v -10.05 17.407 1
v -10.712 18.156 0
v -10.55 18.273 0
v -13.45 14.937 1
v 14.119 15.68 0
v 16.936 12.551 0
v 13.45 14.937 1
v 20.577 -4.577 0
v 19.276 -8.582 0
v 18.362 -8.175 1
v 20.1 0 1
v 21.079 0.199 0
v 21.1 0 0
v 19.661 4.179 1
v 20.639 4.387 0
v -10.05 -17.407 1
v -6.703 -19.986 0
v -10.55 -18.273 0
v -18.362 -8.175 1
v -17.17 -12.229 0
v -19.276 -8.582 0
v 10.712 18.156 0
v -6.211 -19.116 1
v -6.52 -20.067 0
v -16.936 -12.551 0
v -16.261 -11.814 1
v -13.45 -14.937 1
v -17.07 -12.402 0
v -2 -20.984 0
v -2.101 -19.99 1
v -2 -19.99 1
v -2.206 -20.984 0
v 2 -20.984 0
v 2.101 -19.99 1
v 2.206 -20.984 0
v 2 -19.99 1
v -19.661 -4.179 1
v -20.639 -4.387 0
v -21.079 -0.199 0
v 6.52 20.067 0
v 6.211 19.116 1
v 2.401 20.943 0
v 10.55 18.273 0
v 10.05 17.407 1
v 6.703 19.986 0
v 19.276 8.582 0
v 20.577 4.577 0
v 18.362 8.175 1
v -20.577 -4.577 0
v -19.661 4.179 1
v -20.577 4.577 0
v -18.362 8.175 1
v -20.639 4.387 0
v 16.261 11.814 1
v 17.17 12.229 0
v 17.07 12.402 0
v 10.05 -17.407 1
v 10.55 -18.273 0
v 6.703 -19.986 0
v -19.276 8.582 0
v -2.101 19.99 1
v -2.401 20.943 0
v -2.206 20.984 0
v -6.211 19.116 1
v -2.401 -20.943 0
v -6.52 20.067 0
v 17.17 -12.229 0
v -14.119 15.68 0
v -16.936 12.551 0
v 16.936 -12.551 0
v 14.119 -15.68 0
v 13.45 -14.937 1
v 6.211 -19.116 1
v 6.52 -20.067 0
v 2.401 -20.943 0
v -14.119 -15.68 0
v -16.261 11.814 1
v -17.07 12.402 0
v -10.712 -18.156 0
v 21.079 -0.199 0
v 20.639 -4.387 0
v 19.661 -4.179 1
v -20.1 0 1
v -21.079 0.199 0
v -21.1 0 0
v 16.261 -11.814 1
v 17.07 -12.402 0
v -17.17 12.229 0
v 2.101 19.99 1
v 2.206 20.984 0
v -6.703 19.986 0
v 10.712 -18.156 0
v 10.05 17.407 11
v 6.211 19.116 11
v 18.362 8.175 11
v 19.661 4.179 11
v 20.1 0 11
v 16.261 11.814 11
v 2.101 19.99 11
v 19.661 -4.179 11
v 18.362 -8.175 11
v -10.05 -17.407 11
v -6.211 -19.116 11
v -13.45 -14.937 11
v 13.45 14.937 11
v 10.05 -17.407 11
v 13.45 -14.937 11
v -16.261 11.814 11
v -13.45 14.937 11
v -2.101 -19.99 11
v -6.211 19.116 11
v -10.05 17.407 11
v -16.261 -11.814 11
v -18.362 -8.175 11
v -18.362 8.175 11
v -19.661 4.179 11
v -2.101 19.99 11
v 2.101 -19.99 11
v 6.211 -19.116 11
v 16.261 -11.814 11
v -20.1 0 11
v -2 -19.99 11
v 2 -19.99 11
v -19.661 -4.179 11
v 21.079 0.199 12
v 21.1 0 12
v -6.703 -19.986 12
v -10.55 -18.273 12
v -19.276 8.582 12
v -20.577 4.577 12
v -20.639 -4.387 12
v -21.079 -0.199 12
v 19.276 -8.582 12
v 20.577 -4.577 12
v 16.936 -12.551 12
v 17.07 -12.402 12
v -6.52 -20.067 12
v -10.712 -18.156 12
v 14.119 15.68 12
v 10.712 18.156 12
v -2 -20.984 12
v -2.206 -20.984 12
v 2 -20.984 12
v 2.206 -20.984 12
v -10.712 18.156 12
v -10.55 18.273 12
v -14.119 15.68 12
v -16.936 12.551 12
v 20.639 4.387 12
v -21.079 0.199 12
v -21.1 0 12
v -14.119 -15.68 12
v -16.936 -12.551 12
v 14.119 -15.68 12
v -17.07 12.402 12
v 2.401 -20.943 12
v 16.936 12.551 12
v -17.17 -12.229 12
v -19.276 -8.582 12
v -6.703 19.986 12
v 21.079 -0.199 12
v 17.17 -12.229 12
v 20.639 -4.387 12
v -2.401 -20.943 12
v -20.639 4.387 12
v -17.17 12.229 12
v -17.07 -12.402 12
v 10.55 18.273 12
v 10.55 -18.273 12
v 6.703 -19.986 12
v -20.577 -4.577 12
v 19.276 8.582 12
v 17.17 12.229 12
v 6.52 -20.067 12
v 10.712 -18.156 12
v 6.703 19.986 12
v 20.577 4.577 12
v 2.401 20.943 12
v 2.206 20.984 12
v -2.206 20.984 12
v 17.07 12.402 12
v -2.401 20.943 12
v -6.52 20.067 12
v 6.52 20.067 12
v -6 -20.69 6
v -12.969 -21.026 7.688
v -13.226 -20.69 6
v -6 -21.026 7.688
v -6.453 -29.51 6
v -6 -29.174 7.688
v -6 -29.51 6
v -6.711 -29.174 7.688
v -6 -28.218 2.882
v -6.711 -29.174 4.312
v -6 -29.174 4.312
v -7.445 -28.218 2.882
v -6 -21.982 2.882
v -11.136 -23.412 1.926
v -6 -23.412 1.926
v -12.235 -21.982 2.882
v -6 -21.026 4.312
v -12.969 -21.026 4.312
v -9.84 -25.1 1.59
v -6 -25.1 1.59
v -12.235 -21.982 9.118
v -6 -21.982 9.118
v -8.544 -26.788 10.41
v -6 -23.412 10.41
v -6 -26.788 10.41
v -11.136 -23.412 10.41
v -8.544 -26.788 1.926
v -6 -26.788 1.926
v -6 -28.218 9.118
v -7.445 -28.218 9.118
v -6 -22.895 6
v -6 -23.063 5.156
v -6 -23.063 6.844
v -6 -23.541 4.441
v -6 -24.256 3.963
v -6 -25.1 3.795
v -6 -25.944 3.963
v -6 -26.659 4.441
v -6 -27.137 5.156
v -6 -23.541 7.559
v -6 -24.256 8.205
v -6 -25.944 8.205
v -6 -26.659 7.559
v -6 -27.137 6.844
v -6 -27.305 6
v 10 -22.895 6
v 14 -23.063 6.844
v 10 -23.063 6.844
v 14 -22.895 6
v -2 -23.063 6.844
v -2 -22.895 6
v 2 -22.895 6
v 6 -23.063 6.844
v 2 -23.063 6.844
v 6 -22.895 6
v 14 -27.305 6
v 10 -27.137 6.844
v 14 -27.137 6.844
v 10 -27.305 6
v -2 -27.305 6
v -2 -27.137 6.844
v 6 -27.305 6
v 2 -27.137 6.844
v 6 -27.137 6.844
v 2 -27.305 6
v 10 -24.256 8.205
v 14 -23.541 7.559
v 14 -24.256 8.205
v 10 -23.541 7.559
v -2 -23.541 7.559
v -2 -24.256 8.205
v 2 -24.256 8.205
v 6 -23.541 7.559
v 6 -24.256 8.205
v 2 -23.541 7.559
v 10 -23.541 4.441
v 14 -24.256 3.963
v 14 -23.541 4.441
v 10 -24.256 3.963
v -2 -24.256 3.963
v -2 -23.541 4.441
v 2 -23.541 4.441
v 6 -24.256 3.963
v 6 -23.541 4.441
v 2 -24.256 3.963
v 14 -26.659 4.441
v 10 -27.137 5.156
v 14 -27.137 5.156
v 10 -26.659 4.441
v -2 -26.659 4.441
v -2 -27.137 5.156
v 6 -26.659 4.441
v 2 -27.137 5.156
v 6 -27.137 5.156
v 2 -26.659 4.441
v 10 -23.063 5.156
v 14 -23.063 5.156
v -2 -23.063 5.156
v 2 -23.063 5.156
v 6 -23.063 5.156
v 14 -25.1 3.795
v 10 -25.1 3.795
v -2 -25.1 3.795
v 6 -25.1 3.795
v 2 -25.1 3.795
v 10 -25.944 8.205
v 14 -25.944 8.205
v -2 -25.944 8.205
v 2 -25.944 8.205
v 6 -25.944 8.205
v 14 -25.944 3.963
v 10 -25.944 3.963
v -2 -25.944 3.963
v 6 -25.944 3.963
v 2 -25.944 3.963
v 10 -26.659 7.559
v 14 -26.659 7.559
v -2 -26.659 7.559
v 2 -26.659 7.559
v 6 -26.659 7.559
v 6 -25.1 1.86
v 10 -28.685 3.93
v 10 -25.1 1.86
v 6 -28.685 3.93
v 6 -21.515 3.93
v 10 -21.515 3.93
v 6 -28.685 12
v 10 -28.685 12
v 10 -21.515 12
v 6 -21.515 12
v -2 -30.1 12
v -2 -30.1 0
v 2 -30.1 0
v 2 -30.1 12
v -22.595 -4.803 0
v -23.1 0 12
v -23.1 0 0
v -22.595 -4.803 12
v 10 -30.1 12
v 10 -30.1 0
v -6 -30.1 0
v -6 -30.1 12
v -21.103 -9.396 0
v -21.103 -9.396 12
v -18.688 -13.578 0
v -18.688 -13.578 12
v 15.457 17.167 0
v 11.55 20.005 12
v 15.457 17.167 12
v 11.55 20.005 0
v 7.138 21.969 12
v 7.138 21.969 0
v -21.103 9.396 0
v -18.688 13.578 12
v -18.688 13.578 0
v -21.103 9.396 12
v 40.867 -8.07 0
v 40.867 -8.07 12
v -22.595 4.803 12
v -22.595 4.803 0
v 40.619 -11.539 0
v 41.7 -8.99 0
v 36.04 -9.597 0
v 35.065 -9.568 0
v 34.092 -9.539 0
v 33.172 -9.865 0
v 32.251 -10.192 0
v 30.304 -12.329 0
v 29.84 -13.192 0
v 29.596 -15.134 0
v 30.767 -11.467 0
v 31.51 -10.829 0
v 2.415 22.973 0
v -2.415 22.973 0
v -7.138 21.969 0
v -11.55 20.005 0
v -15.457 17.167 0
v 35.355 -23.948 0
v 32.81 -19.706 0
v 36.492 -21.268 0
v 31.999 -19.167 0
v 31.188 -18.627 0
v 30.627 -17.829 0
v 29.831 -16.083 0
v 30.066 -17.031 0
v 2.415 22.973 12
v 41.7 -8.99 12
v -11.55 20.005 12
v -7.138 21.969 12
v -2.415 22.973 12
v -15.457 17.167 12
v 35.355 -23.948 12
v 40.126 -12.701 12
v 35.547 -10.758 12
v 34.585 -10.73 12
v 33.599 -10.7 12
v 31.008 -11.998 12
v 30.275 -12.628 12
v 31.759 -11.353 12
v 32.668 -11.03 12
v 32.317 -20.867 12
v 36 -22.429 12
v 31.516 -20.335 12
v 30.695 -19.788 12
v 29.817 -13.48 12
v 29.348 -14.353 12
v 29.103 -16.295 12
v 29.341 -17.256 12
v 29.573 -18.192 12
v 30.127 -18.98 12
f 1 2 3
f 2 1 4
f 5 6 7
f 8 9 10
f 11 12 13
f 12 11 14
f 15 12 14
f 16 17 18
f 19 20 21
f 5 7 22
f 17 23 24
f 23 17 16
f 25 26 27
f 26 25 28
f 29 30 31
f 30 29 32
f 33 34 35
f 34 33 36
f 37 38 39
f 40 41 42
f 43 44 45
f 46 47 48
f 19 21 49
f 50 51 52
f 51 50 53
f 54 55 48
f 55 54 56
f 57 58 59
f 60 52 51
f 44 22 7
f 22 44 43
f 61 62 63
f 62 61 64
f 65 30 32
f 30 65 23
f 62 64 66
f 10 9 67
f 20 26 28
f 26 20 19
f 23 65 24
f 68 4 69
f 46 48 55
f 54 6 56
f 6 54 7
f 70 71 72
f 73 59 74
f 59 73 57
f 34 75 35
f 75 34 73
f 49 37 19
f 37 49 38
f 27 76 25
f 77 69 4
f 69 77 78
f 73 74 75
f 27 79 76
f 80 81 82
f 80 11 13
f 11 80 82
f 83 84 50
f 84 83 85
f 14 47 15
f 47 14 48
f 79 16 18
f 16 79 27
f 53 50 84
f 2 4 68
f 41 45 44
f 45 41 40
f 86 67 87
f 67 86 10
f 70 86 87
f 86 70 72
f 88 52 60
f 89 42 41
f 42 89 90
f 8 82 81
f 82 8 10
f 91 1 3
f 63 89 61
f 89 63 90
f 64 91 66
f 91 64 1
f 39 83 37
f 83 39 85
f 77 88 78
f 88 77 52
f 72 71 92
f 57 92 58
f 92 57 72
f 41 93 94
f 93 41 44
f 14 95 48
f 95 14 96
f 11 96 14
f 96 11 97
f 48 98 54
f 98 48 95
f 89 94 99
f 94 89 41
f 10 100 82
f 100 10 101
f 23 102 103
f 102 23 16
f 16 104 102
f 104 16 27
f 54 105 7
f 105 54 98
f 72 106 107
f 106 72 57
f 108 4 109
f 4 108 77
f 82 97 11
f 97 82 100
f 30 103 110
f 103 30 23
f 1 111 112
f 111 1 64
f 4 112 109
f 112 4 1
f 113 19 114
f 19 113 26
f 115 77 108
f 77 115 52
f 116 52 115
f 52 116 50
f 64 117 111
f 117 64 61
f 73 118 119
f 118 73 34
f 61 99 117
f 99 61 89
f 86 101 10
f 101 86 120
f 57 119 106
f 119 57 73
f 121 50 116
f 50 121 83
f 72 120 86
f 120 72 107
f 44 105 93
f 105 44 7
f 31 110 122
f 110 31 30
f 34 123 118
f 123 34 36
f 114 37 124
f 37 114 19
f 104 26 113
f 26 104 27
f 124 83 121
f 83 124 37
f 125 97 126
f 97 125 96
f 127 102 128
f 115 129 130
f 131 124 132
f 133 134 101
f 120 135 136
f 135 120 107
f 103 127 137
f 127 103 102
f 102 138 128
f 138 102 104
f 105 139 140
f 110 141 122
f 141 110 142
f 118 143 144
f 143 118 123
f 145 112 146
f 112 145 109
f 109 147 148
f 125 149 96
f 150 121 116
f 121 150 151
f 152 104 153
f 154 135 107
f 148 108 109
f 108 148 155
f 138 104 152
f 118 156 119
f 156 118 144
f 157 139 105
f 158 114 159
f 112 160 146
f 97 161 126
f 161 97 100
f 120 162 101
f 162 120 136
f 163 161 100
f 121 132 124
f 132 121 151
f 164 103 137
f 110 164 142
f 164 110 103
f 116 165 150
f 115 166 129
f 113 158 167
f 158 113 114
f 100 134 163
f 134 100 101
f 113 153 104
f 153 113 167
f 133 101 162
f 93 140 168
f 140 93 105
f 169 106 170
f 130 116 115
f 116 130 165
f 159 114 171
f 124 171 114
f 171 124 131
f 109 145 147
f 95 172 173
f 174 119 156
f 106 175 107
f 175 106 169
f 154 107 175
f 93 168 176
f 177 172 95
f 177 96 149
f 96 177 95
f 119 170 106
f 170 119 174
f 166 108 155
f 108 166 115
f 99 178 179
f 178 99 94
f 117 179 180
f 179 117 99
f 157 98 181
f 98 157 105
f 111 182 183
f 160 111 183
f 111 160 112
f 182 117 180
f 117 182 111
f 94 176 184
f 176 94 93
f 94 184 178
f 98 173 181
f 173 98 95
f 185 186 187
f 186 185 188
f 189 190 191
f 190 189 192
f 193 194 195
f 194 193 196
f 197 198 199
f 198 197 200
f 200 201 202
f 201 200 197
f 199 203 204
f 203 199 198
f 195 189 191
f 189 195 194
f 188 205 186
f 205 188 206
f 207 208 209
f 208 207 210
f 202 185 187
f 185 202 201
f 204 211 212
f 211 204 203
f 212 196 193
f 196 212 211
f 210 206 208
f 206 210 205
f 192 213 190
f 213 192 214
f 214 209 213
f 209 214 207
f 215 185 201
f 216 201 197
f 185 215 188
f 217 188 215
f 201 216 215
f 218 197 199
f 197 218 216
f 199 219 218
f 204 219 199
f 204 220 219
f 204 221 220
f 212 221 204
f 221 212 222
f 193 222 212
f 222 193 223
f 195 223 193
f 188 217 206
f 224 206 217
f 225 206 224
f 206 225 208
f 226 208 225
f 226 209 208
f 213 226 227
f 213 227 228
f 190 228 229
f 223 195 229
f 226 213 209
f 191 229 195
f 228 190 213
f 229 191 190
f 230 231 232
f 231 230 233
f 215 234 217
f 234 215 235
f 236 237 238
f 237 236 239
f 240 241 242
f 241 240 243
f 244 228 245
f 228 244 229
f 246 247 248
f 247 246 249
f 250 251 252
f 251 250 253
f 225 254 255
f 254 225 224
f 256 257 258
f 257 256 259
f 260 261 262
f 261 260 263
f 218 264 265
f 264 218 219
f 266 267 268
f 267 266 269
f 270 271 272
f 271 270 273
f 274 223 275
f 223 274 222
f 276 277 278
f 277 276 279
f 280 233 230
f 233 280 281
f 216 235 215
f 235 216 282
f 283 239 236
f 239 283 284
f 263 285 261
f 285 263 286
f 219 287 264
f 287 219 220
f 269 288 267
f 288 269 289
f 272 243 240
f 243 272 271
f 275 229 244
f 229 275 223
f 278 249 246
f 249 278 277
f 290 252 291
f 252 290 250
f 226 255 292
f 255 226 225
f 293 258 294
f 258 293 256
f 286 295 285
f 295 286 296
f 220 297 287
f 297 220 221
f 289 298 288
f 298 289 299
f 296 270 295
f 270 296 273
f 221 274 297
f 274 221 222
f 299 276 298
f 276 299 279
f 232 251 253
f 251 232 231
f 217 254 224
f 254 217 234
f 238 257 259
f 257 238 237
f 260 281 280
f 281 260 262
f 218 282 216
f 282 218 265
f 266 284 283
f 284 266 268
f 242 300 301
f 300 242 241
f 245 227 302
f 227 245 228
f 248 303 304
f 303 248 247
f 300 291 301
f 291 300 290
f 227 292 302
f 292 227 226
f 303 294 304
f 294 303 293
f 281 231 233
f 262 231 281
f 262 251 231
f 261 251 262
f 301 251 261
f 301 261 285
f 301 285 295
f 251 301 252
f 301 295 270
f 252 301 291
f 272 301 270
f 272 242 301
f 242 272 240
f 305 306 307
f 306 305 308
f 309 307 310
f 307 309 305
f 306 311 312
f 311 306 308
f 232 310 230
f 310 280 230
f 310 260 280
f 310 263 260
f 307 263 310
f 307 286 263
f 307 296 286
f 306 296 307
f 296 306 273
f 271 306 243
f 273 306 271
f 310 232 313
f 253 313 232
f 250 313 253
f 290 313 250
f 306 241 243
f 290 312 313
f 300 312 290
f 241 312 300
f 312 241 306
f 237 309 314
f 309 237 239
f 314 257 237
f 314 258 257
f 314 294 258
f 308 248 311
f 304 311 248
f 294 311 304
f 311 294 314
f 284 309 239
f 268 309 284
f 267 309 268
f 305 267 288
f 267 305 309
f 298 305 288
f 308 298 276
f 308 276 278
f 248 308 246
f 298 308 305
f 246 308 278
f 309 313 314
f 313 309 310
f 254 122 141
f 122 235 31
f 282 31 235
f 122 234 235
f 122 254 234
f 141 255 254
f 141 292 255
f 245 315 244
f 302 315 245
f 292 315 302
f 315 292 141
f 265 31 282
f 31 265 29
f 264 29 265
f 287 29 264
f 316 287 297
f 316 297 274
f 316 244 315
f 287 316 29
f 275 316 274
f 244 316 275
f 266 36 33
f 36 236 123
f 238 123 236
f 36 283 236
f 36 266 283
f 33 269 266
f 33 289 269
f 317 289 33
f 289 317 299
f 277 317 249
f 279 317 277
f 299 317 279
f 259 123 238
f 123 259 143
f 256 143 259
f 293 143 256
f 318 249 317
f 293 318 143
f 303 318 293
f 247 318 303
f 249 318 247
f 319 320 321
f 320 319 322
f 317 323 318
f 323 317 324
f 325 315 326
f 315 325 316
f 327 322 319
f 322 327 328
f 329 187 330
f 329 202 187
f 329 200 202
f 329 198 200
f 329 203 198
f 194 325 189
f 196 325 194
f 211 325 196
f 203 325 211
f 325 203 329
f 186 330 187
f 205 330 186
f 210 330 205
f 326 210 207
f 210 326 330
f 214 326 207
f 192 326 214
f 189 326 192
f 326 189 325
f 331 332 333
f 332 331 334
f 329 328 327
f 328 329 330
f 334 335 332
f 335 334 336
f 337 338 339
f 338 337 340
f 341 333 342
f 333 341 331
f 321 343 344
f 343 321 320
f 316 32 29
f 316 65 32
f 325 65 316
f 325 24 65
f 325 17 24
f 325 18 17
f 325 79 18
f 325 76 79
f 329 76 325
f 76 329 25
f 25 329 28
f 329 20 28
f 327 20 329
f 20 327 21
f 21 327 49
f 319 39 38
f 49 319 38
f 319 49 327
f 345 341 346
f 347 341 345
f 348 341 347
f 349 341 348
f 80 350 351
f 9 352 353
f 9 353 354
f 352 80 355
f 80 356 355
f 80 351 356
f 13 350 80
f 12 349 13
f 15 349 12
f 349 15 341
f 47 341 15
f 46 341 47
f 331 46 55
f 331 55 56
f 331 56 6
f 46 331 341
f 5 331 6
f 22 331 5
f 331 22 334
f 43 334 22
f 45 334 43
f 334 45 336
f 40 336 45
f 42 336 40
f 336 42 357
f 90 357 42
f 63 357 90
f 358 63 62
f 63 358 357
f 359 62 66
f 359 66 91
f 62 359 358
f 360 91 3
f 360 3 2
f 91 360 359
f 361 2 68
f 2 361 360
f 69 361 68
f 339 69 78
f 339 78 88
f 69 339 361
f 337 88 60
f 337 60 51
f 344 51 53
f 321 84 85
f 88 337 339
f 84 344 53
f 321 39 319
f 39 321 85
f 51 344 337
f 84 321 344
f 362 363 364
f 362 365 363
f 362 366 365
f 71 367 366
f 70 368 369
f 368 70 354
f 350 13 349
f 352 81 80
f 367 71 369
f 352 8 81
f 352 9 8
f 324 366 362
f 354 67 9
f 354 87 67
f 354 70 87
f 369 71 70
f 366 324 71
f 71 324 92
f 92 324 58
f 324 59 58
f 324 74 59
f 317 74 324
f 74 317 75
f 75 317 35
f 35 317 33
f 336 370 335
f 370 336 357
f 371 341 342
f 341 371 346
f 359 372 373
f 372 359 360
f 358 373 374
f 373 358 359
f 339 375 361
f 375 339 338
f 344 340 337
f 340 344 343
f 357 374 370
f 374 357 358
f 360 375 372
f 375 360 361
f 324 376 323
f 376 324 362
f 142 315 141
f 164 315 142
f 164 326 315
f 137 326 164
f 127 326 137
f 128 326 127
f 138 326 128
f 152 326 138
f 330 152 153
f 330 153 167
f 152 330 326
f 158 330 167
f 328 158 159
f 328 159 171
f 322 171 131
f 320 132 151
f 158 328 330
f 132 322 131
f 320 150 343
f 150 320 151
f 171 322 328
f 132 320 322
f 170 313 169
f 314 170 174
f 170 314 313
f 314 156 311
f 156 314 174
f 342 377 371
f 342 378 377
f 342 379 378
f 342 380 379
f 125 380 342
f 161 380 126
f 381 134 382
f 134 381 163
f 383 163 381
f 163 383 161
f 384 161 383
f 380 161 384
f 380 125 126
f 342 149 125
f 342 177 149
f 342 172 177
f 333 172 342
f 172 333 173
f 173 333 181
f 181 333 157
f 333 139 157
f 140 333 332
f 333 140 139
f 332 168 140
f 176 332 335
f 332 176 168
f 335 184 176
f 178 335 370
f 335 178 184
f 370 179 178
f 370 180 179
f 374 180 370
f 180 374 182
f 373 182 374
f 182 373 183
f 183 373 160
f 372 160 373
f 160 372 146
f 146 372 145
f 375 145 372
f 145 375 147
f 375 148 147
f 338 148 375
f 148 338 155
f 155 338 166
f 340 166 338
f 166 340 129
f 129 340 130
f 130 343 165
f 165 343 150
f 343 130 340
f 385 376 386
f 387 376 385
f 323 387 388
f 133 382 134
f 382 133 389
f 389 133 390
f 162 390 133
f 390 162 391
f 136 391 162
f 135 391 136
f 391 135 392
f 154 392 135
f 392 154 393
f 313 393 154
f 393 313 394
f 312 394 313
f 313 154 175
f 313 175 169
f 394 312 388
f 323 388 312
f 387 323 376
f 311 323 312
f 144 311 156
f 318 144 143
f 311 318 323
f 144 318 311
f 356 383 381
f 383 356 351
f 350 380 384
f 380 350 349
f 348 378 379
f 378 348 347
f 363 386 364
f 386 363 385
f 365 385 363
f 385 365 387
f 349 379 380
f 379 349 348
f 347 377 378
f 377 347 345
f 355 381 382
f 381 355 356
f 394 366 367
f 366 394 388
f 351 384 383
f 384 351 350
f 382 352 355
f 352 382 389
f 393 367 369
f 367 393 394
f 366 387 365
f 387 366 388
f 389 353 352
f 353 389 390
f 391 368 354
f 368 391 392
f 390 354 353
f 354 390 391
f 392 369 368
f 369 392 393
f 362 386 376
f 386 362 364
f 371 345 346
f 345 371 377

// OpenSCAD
//use <../standard_optomechanics/cylinder_clamp.scad>;
//use <cylinder_clip.scad>;
use <utilities.scad>;

t = 3;
h = 12;
inner_r = 20.1;
rack_r = 5+0.3;

tube_to_tube = 12.5;
c2c_distance = (inner_r + rack_r + tube_to_tube);
rack_angle = -90-asin( (inner_r - rack_r) / c2c_distance);

d=0.05;

module rack_frame(){
    rotate(rack_angle) translate([0,c2c_distance,0]) children();
}

module rack(){
	 rack_frame() rotate([0,6,0]) //rotate([0,2.5,-90])
				hull() repeat([0,999,0],2) cylinder(r=rack_r,h=999*2,center=true);
}

union(){
	difference(){
		union(){
			hull(){ //this bit holds the rack tube
                cylinder(r=inner_r+t,h=h);
				rotate(18) translate([inner_r+t/2,0,0]) cylinder(r=t/2,h=h);
				rack_frame() cylinder(r=5+4,h=h);
                translate([2,-inner_r-5,h/2]) cube([16,10,h],center=true);
			}
		}
        
        chamfered_hole(r=inner_r,h=h);
		translate([0,-inner_r-5,h/2]) rotate(90) pinch_y(4,t=4, top_access=true,screw_l=10,extra_height=0);
        
        //clearance for nut/bolt
        //translate([0,-inner_r-5,h/2]) cube([30,8,h-3],center=true);

		//clearance for rack
		rack();
		rack_frame() translate([0,4+999,0]) cube([1,1,1]*999*2,center=true);
//		translate(rack + [0,-4,-1]) mirror([1,0,0]) mirror([0,1,0]) cube([1,1,1]*999);
	}
}
